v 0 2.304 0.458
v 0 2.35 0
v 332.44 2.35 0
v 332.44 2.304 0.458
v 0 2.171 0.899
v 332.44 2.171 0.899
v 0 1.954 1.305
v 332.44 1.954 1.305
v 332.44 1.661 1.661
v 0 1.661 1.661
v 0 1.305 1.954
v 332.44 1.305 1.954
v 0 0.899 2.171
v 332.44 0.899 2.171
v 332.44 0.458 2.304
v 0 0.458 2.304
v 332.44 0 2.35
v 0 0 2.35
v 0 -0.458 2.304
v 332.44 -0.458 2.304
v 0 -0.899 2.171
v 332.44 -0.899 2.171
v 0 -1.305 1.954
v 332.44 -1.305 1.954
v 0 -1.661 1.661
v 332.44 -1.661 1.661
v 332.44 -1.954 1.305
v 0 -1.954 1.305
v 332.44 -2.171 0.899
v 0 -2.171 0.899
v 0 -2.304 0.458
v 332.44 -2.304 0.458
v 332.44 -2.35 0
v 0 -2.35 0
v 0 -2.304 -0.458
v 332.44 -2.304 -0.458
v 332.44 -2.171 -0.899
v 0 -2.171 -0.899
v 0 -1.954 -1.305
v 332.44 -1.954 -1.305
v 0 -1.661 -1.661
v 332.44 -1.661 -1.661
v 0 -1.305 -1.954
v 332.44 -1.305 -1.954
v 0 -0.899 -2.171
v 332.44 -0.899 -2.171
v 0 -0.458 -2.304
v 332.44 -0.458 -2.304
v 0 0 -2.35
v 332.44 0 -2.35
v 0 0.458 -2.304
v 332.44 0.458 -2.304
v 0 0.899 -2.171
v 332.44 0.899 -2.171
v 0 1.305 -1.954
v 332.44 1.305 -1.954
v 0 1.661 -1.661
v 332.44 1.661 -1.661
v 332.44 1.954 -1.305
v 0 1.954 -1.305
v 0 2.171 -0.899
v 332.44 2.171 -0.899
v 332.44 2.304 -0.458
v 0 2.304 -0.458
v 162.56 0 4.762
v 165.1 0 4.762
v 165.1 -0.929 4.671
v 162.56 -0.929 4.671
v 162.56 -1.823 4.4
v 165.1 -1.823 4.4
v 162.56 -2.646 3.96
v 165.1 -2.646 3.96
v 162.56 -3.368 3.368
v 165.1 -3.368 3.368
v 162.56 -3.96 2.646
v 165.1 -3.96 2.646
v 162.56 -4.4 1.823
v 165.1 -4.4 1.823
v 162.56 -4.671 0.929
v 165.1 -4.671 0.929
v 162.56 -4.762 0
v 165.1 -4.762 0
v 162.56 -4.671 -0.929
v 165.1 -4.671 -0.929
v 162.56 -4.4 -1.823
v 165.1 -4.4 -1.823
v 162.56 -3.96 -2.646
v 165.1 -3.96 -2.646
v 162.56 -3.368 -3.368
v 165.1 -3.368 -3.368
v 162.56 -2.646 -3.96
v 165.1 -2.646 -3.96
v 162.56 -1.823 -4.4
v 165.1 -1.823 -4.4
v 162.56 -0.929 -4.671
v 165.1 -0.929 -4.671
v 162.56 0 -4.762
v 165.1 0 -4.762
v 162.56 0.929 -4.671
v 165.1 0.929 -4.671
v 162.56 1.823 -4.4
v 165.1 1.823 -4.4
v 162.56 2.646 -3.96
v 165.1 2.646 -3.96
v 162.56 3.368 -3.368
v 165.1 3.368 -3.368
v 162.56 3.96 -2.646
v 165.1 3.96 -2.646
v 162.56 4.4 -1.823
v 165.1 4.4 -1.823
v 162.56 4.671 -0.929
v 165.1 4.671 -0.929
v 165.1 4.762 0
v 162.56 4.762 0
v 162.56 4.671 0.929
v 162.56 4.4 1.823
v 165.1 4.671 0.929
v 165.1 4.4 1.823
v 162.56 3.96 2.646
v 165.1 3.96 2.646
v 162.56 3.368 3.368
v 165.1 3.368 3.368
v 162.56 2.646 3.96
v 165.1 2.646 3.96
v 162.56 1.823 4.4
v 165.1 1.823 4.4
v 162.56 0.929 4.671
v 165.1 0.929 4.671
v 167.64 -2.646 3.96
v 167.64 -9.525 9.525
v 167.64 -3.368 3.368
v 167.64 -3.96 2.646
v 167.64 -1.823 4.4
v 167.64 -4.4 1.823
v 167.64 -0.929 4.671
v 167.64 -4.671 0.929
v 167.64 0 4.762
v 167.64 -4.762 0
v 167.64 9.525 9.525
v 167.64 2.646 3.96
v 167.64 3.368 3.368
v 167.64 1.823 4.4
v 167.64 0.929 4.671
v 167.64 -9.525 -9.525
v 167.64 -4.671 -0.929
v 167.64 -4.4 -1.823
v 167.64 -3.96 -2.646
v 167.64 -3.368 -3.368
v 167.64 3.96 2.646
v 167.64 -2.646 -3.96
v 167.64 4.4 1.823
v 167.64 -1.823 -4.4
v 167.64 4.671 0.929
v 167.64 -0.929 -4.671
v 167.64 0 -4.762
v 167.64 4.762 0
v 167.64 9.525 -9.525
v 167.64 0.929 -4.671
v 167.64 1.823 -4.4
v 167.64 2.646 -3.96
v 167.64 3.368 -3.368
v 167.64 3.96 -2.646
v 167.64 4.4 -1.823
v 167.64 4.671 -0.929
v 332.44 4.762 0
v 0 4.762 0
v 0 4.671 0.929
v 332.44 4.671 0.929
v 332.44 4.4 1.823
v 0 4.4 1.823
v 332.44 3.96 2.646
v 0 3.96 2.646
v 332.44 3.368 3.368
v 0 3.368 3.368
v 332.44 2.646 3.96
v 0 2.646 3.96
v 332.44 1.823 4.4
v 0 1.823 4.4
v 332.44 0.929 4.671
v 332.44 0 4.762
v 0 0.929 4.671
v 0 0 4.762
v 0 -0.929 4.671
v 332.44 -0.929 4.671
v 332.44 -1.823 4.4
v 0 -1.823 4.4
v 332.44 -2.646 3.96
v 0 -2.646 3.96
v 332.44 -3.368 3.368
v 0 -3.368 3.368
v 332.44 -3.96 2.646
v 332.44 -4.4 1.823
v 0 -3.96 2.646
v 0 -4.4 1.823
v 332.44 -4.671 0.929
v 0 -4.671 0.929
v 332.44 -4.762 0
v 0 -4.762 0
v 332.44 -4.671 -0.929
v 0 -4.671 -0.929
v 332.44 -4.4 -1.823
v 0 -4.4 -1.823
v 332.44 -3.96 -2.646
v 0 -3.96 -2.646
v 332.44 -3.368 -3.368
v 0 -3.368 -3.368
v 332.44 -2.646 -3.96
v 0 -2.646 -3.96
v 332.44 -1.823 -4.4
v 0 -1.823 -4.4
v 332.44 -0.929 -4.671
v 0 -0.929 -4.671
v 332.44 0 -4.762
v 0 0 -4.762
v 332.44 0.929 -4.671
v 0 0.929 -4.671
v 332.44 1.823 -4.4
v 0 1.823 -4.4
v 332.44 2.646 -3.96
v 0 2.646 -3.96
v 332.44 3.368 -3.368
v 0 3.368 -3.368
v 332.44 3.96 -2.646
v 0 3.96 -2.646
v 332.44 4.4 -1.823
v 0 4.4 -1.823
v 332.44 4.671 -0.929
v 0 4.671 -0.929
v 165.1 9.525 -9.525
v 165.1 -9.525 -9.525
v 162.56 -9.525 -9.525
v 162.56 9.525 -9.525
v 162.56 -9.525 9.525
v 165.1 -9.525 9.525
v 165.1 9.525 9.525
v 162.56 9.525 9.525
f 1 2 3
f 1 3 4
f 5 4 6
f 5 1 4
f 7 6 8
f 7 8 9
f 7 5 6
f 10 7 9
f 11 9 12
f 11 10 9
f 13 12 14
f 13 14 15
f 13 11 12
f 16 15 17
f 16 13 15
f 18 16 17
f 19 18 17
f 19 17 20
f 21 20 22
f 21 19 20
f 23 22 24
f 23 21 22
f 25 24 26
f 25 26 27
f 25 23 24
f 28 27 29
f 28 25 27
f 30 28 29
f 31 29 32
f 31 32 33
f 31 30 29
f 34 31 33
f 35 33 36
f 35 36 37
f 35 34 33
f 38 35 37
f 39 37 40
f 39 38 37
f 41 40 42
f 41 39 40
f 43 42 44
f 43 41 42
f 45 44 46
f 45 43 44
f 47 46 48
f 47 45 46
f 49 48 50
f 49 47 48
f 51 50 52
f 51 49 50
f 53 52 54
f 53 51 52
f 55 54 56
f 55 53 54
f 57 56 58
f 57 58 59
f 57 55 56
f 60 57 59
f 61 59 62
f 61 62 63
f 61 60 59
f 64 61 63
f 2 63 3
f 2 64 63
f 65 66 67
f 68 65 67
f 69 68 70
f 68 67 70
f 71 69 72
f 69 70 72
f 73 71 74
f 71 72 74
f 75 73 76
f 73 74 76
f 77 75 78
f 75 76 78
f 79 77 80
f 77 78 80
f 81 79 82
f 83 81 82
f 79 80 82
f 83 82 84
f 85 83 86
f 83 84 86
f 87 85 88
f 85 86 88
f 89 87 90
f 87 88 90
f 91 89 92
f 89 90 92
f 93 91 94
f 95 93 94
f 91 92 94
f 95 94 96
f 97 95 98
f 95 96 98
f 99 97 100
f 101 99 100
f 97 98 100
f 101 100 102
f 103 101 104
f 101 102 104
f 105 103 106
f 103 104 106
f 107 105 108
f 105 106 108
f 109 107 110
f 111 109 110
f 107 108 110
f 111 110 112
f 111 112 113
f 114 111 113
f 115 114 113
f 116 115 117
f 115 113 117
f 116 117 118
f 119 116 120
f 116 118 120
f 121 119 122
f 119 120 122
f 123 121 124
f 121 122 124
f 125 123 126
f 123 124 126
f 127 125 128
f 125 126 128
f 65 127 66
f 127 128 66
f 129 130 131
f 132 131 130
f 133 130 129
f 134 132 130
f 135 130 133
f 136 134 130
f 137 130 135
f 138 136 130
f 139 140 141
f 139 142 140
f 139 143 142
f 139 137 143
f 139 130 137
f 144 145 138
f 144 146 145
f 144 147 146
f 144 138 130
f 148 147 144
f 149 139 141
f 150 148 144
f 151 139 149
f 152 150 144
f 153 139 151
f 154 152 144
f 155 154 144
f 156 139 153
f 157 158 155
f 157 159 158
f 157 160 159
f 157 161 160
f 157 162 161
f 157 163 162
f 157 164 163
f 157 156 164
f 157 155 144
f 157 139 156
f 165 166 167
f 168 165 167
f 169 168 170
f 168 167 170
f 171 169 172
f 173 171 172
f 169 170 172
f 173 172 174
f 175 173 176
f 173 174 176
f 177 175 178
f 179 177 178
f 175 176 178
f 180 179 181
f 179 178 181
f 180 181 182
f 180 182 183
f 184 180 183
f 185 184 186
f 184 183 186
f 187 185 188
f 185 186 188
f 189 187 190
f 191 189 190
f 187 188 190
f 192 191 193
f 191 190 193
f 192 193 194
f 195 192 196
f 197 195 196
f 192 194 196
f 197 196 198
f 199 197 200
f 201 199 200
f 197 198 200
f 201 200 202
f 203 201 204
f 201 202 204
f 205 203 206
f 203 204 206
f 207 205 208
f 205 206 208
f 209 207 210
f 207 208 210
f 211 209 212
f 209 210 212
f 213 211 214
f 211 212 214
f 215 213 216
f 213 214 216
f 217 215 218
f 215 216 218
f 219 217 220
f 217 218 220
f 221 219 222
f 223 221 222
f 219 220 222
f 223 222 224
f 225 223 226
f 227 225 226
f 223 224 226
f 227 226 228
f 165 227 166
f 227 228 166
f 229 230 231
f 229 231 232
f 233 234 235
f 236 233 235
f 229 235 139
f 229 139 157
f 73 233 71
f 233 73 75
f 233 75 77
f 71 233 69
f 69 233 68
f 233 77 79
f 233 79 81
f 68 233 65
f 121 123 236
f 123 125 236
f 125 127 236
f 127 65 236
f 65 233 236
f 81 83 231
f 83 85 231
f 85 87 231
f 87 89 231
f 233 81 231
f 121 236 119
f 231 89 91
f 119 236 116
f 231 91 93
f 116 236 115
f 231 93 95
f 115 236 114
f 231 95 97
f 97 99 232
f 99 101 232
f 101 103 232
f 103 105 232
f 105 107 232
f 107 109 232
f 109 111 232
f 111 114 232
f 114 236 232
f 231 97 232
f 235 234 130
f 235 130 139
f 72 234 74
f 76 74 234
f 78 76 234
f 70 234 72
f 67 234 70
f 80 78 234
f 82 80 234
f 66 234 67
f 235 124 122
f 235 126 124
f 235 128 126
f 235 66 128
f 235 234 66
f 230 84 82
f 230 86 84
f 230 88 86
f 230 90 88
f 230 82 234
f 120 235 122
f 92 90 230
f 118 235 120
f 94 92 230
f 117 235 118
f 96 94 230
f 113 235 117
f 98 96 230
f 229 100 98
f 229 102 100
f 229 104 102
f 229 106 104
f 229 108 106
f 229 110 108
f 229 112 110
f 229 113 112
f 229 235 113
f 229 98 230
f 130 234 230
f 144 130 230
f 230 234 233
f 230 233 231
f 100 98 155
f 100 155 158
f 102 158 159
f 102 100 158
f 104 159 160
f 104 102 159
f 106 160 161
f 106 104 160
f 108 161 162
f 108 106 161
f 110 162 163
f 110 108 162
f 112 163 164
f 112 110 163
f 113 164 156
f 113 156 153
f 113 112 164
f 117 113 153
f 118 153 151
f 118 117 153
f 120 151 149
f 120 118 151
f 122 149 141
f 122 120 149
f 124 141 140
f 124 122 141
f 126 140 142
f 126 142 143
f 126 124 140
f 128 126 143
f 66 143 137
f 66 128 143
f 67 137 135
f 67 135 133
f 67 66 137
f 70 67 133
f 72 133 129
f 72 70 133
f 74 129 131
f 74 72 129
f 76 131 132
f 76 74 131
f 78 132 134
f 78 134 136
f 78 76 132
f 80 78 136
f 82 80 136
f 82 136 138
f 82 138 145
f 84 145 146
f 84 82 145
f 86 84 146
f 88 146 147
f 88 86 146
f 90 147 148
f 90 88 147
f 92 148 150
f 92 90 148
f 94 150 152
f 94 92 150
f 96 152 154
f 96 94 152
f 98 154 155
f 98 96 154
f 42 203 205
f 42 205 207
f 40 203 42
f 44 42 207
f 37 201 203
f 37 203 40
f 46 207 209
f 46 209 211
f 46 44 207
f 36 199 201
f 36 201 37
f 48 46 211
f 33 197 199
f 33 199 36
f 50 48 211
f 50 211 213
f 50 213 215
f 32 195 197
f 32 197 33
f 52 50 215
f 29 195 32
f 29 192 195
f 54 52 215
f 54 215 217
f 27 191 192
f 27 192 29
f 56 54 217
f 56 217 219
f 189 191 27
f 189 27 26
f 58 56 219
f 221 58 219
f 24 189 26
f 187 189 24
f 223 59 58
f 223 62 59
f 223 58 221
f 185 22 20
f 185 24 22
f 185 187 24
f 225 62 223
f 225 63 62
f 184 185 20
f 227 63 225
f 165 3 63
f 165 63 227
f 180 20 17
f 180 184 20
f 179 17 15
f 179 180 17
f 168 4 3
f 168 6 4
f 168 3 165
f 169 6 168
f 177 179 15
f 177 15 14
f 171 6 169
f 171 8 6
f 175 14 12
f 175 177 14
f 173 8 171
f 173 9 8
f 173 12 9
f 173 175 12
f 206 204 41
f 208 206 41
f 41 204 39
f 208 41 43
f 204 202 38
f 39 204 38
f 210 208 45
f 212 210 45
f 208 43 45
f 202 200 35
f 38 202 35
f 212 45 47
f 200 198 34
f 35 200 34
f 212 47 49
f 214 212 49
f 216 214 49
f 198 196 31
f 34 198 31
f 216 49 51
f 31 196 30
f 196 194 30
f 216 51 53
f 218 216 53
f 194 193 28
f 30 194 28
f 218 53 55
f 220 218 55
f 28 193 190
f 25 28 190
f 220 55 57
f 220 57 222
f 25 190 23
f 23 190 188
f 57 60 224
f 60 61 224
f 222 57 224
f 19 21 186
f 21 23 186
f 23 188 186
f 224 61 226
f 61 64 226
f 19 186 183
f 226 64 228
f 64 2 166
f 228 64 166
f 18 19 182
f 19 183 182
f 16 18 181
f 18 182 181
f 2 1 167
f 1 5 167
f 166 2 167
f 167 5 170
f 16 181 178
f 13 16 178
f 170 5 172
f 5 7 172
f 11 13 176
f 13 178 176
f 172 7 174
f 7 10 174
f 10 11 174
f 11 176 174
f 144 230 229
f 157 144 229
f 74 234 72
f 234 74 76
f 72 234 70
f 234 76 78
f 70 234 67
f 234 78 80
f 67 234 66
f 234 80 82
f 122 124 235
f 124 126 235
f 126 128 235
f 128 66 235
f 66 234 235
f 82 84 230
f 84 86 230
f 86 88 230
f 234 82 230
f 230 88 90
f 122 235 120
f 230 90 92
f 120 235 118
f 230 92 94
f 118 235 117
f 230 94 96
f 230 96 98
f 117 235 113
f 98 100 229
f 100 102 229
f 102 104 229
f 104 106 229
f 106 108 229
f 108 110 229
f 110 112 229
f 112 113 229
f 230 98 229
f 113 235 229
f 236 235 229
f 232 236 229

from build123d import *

# Parameters (mm, degrees)
SKETCH1_R            = 4.7625
SKETCH1_R_2          = 2.3495
TOE_ROD_MEMBER_DEPTH = 332.4405
TOE_START            = 165.1
SKETCH2_W            = 19.05
SKETCH2_H            = 19.05
SKETCH2_R            = 4.7625
TOE_ROD_NUT_1_DEPTH  = 2.54
SKETCH3_W            = 19.05
SKETCH3_H            = 19.05
SKETCH3_R            = 4.7625
TOE_ROD_NUT_2_DEPTH  = 2.54


with BuildPart() as part:
    # Sketch1 → Toe Rod Member (new body)
    with BuildSketch(Plane.YZ):
        Circle(SKETCH1_R)
        Circle(SKETCH1_R_2, mode=Mode.SUBTRACT)
    extrude(amount=TOE_ROD_MEMBER_DEPTH)


with BuildPart() as body_2:
    # Sketch2 → Toe Rod Nut 1 (new body)
    with BuildSketch(Plane(origin=(0, 0, 0), x_dir=(0, 0, -1), z_dir=(1, 0, 0)).offset(TOE_START)):
        Rectangle(SKETCH2_W, SKETCH2_H)
        Circle(SKETCH2_R, mode=Mode.SUBTRACT)
    extrude(amount=TOE_ROD_NUT_1_DEPTH)


with BuildPart() as body_3:
    # Sketch3 → Toe Rod Nut 2 (new body)
    with BuildSketch(Plane(origin=(0, 0, 0), x_dir=(0, 0, -1), z_dir=(1, 0, 0)).offset(TOE_START)):
        Rectangle(SKETCH3_W, SKETCH3_H)
        with Locations(Location((0, 0, 0), (0, 0, 180))):
            Circle(SKETCH3_R, mode=Mode.SUBTRACT)
    extrude(amount=-TOE_ROD_NUT_2_DEPTH)


solid = Compound([part.part, body_2.part, body_3.part])
